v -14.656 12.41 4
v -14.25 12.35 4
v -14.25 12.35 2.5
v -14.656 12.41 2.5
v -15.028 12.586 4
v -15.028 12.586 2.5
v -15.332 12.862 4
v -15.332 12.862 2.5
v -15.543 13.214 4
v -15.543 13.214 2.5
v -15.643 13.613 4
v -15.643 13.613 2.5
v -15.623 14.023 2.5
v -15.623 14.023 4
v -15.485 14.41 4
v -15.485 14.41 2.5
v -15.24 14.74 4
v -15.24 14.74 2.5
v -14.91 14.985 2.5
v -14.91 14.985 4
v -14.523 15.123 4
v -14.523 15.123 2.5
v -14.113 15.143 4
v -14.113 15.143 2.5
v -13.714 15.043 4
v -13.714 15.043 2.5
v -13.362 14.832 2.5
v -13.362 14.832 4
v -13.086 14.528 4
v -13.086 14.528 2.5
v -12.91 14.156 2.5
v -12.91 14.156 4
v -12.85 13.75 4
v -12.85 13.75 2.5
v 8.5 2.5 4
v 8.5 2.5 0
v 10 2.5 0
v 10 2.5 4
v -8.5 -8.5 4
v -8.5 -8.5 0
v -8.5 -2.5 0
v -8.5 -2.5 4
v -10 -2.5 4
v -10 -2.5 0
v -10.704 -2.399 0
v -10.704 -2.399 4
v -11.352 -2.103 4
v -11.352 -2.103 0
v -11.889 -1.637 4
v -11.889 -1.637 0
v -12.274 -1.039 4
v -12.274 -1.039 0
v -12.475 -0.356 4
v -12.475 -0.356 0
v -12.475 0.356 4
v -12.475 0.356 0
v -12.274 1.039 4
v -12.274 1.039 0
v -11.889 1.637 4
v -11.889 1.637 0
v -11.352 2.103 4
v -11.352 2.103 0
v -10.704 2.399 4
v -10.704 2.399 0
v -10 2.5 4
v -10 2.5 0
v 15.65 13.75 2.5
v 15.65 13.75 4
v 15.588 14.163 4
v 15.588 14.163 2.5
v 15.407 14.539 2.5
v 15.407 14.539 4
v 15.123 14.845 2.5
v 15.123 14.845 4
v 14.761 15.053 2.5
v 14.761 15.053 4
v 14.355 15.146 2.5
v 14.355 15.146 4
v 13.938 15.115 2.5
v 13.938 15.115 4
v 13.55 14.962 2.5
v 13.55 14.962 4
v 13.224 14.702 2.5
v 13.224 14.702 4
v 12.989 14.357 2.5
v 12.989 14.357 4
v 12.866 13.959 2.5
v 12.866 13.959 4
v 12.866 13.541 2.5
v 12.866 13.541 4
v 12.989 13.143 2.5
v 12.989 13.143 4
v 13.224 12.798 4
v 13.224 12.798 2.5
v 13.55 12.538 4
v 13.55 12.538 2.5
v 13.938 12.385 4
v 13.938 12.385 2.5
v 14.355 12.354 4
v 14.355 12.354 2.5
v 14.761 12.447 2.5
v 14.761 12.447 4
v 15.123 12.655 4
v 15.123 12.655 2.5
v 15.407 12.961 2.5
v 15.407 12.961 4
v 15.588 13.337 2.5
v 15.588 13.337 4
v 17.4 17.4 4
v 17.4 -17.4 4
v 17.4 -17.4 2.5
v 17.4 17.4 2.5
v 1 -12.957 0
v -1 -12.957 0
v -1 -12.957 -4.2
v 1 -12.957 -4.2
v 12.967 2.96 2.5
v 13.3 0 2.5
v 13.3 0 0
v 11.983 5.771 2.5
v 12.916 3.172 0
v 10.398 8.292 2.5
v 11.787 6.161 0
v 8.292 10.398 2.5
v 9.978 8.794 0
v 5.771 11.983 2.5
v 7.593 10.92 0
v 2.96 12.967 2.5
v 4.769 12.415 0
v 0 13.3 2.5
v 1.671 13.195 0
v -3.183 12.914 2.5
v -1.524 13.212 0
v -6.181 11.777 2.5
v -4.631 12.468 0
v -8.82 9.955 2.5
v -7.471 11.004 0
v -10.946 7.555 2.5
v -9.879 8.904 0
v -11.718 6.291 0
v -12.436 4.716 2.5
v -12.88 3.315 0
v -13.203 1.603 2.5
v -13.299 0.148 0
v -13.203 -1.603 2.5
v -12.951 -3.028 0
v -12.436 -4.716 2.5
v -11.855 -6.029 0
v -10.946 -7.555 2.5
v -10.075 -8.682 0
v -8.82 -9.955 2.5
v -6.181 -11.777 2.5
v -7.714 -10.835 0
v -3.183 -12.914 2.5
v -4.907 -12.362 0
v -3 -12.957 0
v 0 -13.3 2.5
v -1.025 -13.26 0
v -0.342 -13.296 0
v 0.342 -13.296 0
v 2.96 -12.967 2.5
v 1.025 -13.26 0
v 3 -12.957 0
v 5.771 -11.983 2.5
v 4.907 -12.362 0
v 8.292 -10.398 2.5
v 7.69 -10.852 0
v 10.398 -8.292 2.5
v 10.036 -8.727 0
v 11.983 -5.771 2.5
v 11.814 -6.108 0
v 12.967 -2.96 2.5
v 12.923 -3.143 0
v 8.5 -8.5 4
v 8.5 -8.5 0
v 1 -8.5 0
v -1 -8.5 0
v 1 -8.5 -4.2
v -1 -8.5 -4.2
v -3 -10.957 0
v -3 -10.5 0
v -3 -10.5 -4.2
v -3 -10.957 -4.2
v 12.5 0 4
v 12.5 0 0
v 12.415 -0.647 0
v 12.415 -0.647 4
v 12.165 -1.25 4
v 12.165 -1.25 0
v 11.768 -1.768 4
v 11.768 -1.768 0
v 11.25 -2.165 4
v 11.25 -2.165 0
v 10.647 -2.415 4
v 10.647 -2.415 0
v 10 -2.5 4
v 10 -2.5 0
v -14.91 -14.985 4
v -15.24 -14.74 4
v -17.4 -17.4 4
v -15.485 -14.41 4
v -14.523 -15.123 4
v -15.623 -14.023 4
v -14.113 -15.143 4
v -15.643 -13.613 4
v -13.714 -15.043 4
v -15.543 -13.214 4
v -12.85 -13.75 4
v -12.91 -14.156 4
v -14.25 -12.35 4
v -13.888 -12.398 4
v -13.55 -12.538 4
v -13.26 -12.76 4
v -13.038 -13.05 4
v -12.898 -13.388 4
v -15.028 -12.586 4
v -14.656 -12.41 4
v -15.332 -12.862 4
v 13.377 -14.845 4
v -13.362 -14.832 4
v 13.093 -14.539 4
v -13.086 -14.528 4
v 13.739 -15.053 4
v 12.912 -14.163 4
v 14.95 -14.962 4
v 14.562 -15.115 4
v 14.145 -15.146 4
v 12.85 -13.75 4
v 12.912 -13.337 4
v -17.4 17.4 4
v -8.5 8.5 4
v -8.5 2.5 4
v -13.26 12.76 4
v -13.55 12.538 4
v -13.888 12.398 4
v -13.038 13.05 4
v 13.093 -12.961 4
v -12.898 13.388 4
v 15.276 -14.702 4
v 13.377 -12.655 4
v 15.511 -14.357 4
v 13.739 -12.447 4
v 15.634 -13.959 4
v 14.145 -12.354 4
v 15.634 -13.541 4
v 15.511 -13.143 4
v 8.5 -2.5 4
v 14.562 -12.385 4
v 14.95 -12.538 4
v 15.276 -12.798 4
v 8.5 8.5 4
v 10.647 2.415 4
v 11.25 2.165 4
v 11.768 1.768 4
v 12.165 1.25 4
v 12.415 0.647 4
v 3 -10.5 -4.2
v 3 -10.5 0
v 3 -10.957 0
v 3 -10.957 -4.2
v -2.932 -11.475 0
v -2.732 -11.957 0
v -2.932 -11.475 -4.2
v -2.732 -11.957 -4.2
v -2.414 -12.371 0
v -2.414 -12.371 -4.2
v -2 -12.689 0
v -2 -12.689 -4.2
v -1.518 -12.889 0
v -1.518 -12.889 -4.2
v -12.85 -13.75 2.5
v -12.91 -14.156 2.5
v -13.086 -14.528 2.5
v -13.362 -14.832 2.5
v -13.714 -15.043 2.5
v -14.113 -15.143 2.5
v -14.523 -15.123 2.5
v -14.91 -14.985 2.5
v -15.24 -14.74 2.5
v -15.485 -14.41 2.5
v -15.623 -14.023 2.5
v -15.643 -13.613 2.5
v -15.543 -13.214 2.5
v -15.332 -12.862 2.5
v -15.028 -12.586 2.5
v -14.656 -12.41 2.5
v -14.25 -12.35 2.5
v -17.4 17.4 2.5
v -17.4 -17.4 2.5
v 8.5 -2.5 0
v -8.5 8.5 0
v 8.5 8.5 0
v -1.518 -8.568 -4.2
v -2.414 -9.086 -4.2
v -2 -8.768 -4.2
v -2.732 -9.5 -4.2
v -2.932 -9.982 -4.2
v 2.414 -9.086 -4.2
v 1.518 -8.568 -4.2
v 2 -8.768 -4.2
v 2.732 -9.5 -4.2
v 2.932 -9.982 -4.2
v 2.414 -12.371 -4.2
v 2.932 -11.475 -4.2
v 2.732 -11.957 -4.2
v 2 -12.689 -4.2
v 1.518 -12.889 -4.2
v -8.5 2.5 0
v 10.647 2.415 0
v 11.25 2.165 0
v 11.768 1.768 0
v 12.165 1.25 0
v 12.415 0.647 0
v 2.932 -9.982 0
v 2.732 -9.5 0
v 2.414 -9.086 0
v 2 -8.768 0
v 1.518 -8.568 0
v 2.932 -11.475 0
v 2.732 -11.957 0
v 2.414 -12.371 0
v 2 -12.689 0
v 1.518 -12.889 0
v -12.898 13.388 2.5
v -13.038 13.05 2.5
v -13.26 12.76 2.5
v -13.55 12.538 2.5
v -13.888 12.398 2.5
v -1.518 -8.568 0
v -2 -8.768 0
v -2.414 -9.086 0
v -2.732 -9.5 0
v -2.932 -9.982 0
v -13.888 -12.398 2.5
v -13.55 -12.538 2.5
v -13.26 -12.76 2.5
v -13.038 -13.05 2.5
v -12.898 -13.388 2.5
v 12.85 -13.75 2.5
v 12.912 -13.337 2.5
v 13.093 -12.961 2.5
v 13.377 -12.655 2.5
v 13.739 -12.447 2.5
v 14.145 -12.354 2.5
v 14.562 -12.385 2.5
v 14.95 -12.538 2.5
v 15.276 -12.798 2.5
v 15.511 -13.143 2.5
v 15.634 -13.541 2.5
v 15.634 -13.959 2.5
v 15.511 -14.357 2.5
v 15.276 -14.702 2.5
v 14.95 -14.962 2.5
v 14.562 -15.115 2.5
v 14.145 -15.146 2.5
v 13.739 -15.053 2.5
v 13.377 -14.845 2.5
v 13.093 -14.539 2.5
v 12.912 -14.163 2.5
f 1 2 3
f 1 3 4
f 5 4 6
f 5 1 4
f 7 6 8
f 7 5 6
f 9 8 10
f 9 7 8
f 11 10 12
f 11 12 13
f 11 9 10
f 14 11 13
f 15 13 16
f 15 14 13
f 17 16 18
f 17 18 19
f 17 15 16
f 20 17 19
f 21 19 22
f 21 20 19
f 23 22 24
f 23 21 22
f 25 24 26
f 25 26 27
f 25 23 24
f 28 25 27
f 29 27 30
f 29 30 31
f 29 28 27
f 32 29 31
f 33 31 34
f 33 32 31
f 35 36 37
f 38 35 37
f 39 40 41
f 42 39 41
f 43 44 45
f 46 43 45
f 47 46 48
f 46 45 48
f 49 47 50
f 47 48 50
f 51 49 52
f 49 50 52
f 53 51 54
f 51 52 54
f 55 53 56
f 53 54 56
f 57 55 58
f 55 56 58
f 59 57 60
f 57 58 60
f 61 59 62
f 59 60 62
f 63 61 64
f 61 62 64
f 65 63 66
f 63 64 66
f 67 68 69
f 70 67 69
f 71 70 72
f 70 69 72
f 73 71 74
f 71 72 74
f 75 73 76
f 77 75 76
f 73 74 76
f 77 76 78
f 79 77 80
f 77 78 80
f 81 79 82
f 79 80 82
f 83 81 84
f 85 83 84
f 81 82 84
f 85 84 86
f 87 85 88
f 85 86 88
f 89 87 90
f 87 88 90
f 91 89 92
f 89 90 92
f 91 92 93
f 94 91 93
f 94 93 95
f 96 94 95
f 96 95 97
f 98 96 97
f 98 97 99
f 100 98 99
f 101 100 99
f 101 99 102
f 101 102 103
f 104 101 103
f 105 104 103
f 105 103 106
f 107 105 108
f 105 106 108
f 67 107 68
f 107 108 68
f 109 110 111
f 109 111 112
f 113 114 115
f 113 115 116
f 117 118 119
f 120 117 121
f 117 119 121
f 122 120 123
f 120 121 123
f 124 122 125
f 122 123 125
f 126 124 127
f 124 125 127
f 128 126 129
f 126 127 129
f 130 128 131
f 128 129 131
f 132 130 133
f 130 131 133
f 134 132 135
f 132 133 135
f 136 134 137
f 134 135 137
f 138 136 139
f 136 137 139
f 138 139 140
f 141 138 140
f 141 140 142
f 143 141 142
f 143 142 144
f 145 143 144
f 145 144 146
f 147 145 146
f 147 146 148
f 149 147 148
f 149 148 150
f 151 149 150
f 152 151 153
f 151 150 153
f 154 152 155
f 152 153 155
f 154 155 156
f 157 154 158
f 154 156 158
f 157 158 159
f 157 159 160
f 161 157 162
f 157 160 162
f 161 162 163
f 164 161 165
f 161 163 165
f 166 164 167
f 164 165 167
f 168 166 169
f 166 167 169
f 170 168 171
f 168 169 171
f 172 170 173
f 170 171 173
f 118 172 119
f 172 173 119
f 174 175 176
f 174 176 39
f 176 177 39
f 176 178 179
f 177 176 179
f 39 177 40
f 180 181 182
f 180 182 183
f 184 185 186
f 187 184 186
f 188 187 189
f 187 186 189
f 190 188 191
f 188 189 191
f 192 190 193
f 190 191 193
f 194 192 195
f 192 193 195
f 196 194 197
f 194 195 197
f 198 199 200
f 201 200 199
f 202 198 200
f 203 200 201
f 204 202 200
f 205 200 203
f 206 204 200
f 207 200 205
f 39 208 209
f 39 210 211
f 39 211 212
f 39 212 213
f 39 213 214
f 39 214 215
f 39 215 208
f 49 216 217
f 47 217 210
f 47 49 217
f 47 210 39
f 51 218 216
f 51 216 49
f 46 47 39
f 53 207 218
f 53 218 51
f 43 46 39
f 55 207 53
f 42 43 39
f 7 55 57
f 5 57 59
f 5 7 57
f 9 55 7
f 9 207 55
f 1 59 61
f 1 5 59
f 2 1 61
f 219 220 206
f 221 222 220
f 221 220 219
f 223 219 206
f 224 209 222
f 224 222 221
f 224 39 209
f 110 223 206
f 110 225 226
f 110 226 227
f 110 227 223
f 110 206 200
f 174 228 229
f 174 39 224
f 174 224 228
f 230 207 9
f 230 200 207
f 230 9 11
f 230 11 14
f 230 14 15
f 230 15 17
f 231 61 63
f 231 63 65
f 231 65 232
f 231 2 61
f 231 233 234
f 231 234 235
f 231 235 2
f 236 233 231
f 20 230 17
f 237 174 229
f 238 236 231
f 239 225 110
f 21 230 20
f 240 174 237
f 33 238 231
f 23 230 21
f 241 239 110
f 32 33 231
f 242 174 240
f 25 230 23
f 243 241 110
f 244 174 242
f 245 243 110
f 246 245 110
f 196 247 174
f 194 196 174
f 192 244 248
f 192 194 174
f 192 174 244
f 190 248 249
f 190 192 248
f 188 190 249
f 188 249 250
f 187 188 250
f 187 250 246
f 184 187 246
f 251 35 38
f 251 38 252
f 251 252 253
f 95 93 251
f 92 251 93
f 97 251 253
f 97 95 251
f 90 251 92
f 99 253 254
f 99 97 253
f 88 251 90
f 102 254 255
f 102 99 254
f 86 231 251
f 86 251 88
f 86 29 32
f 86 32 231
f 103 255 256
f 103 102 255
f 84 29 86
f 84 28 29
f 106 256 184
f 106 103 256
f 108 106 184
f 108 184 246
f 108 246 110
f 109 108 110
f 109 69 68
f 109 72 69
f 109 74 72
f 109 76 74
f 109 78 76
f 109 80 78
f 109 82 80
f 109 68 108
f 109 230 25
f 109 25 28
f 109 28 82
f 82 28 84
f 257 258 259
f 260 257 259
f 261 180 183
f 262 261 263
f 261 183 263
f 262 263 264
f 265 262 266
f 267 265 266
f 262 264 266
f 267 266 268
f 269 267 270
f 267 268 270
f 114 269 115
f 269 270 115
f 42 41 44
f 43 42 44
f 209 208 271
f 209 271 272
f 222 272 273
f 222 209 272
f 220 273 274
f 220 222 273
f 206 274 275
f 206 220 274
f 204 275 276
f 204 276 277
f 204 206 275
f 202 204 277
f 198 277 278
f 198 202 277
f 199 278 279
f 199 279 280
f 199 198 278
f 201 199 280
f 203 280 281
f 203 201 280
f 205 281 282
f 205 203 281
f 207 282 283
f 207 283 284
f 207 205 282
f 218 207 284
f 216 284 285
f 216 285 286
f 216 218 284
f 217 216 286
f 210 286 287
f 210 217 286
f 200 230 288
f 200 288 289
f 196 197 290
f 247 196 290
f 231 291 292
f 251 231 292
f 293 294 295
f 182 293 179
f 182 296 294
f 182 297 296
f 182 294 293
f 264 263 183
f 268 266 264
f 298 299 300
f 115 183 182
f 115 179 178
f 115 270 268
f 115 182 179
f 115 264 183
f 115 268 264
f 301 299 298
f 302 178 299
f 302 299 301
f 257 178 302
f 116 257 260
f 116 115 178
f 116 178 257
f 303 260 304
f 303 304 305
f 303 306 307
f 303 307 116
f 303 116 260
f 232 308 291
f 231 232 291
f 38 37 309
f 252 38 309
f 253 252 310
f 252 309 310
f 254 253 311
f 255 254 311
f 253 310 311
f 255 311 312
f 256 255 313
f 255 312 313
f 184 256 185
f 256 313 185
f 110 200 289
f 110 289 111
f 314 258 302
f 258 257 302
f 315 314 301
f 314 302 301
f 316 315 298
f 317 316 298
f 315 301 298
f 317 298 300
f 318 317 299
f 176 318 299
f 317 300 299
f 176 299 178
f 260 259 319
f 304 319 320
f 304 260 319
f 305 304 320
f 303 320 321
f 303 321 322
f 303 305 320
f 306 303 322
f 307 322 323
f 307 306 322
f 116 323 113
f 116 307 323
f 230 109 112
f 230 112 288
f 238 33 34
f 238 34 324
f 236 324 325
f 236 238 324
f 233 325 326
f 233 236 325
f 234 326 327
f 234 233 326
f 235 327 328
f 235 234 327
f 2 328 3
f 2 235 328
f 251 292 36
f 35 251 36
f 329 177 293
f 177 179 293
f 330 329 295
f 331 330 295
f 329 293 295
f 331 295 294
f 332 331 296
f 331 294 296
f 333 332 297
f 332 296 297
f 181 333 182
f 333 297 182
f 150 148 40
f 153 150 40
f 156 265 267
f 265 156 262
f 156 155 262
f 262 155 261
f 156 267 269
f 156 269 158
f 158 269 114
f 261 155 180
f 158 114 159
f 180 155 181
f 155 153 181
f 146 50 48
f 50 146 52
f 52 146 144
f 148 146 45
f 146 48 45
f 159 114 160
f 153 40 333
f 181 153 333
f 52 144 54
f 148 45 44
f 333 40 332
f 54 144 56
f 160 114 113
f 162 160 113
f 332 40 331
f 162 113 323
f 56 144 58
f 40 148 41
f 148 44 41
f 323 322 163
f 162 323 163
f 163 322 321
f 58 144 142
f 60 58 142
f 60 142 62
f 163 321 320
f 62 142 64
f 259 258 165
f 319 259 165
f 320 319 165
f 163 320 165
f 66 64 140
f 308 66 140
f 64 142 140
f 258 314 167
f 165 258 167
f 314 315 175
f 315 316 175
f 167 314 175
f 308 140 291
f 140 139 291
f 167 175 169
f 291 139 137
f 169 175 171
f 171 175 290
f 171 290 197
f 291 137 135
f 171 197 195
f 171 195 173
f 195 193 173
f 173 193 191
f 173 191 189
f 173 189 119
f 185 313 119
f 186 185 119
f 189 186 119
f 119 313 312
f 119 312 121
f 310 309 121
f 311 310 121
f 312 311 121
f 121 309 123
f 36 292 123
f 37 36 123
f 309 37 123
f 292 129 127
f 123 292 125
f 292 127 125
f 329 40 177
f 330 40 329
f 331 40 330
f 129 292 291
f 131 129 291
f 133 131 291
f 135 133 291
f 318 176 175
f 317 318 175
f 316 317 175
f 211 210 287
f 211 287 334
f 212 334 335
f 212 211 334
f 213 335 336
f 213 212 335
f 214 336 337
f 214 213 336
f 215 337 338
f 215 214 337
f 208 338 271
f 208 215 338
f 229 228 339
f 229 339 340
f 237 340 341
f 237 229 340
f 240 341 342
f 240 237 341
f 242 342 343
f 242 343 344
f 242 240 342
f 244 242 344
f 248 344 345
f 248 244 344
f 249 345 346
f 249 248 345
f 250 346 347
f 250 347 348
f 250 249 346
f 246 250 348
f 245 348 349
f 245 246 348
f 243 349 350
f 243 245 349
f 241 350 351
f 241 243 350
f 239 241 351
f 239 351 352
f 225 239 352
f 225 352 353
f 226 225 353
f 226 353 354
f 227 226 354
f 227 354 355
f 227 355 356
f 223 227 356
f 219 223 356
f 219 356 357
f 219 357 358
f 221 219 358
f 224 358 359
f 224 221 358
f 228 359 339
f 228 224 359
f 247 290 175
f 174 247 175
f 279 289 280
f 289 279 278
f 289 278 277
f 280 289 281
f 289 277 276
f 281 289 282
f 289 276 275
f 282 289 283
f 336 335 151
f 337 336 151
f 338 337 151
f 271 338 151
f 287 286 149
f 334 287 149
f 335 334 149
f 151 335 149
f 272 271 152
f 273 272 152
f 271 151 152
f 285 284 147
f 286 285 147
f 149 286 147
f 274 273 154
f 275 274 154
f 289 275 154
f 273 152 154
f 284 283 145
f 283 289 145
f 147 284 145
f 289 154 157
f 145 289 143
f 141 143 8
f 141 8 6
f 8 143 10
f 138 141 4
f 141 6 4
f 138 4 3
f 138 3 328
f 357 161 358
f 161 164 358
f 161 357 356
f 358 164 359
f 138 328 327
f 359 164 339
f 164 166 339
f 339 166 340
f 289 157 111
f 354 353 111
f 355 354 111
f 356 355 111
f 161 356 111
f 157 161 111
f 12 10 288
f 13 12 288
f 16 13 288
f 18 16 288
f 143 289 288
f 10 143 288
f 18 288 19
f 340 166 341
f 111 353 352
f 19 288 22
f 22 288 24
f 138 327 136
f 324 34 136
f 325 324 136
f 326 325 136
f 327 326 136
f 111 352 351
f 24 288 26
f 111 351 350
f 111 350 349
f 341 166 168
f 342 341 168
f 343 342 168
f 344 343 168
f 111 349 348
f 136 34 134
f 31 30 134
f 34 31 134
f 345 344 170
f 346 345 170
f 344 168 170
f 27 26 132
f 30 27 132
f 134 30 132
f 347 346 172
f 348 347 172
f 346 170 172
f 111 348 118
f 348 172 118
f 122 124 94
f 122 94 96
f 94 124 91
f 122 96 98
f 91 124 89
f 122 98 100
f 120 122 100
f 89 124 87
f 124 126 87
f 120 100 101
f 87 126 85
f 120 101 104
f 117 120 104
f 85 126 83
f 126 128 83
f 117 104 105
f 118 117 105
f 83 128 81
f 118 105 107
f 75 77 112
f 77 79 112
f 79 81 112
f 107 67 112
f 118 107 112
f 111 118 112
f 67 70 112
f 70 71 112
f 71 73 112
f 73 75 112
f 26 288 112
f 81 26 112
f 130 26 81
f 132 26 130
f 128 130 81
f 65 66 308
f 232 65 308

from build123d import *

# Parameters (mm, degrees)
F0_R     = 13.3
F1_DEPTH = 4
F2_W     = 6
F2_H     = 4.4572373599
F3_DEPTH = 4.2
F4_R     = 2
F5_R     = 1.4
F6_DEPTH = 1.5


with BuildPart() as f1:
    # F0 (on Top) → F1 (new body)
    with BuildSketch(Plane.XY):
        Circle(F0_R)
        with BuildLine():
            Line((0, -8.5), (-8.5, -8.5))
            Line((-8.5, -8.5), (-8.5, -2.5))
            Line((-8.5, -2.5), (-10, -2.5))
            ThreePointArc((-10, -2.5), (-12.5, 0), (-10, 2.5))
            Line((-10, 2.5), (-8.5, 2.5))
            Line((-8.5, 2.5), (-8.5, 8.5))
            Line((-8.5, 8.5), (0, 8.5))
            Line((0, 8.5), (8.5, 8.5))
            Line((8.5, 8.5), (8.5, 2.5))
            Line((8.5, 2.5), (10, 2.5))
            ThreePointArc((10, 2.5), (11.767766953, 1.767766953), (12.5, 0))
            ThreePointArc((12.5, 0), (11.767766953, -1.767766953), (10, -2.5))
            Line((10, -2.5), (8.5, -2.5))
            Line((8.5, -2.5), (8.5, -8.5))
            Line((8.5, -8.5), (0, -8.5))
        make_face(mode=Mode.SUBTRACT)
    extrude(amount=F1_DEPTH)

    # F2 (on face) → F3 (join)
    with BuildSketch(Plane(origin=(0, 0, 0), x_dir=(1, 0, 0), z_dir=(0, 0, -1))):
        with Locations((0, 10.7286186799)):
            Rectangle(F2_W, F2_H)
    extrude(amount=F3_DEPTH)

    # F4
    f4_edges = [f1.edges().sort_by_distance(p)[0] for p in [
        (-3, -12.957237, -2.1),
        (-3, -8.5, -2.1),
        (3, -8.5, -2.1),
        (3, -12.957237, -2.1),
    ]]
    fillet(f4_edges, radius=F4_R)

    # F5 (on face) → F6 (join)
    with BuildSketch(Plane.XY.offset(4)):
        with BuildLine():
            ThreePointArc((0, 13.3), (9.4045201898, 9.4045201898), (13.3, 0))
            ThreePointArc((13.3, 0), (9.4045201898, -9.4045201898), (0, -13.3))
            Line((0, -13.3), (0, -13.75))
            Line((0, -13.75), (0, -17.4))
            Line((0, -17.4), (17.4, -17.4))
            Line((17.4, -17.4), (17.4, 17.4))
            Line((17.4, 17.4), (0, 17.4))
            Line((0, 17.4), (0, 13.3))
        make_face()
        with BuildLine():
            ThreePointArc((15.65, -13.75), (14.25, -15.15), (12.85, -13.75))
            ThreePointArc((12.85, -13.75), (14.25, -12.35), (15.65, -13.75))
        make_face(mode=Mode.SUBTRACT)
        with Locations((14.25, 13.75)):
            Circle(F5_R, mode=Mode.SUBTRACT)
        with BuildLine():
            Line((0, 8.5), (0, 13.3))
            ThreePointArc((0, 13.3), (-9.4045201898, 9.4045201898), (-13.3, 0))
            Line((-13.3, 0), (-12.5, 0))
            ThreePointArc((-12.5, 0), (-11.767766953, 1.767766953), (-10, 2.5))
            Line((-10, 2.5), (-8.5, 2.5))
            Line((-8.5, 2.5), (-8.5, 8.5))
            Line((-8.5, 8.5), (0, 8.5))
        make_face()
        with BuildLine():
            ThreePointArc((-13.3, 0), (-9.4045201898, 9.4045201898), (0, 13.3))
            Line((0, 13.3), (0, 17.4))
            Line((0, 17.4), (-17.4, 17.4))
            Line((-17.4, 17.4), (-17.4, -17.4))
            Line((-17.4, -17.4), (0, -17.4))
            Line((0, -17.4), (0, -13.75))
            Line((0, -13.75), (-12.85, -13.75))
            ThreePointArc((-12.85, -13.75), (-15.2399494937, -14.7399494937), (-14.25, -12.35))
            Line((-14.25, -12.35), (-14.25, 0))
            Line((-14.25, 0), (-13.3, 0))
        make_face()
        with BuildLine():
            ThreePointArc((-12.85, 13.75), (-13.2600505063, 12.7600505063), (-14.25, 12.35))
            ThreePointArc((-14.25, 12.35), (-15.2399494937, 14.7399494937), (-12.85, 13.75))
        make_face(mode=Mode.SUBTRACT)
        with BuildLine():
            Line((0, -13.75), (0, -13.3))
            ThreePointArc((0, -13.3), (-9.4045201898, -9.4045201898), (-13.3, 0))
            Line((-13.3, 0), (-14.25, 0))
            Line((-14.25, 0), (-14.25, -12.35))
            ThreePointArc((-14.25, -12.35), (-13.2600505063, -12.7600505063), (-12.85, -13.75))
            Line((-12.85, -13.75), (0, -13.75))
        make_face()
        with BuildLine():
            ThreePointArc((-13.3, 0), (-9.4045201898, -9.4045201898), (0, -13.3))
            Line((0, -13.3), (0, -8.5))
            Line((0, -8.5), (-8.5, -8.5))
            Line((-8.5, -8.5), (-8.5, -2.5))
            Line((-8.5, -2.5), (-10, -2.5))
            ThreePointArc((-10, -2.5), (-11.767766953, -1.767766953), (-12.5, 0))
            Line((-12.5, 0), (-13.3, 0))
        make_face()
    extrude(amount=-F6_DEPTH)


solid = f1.part
